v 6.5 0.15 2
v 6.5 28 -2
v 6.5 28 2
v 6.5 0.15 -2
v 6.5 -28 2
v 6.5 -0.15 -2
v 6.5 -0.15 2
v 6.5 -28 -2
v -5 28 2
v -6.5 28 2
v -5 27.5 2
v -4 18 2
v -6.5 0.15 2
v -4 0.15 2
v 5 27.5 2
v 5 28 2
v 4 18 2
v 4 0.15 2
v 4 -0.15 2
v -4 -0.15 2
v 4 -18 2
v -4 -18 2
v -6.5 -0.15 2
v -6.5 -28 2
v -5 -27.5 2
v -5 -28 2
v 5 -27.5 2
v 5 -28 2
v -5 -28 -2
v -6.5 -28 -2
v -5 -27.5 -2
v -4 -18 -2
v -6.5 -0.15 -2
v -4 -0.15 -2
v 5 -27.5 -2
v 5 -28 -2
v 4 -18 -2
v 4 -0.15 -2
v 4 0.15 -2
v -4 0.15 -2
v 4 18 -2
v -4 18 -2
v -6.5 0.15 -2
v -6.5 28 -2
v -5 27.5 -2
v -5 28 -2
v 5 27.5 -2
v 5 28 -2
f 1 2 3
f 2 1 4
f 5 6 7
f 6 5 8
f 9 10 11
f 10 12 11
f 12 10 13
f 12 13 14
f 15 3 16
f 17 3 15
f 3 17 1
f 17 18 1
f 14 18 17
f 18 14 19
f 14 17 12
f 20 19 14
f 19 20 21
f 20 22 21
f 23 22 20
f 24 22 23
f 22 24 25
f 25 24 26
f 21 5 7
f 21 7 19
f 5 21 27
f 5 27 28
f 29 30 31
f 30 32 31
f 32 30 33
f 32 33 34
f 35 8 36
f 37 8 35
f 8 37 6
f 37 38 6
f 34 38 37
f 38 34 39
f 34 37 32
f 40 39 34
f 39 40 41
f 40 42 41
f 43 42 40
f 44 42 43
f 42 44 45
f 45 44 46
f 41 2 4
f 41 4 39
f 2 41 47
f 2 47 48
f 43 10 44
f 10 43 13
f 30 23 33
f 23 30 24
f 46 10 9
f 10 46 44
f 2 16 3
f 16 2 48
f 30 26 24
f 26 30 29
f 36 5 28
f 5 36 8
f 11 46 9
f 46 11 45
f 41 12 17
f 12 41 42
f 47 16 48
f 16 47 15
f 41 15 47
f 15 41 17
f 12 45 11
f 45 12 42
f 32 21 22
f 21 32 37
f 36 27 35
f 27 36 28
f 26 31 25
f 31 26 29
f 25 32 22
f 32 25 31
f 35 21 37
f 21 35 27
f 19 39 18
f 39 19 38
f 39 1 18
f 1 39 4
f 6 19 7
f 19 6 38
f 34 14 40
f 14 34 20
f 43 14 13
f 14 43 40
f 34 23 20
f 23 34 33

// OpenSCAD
WIDTH = 13;
HEIGHT = 4;
LENGTH = 56;
BAR_LENGTH = 36;
BAR_WIDTH_MID = 8;
BAR_WIDTH_OUT = 10;
SLOT_WIDTH = 0.3;
SLOT_LENGTH = (WIDTH - min(BAR_WIDTH_OUT, BAR_WIDTH_MID))/2;

module bar() {
  #translate([0, BAR_LENGTH/2, 0])
  hull() {
    translate([0, 0.5, 0])
    cube(size = [BAR_WIDTH_MID, 1, HEIGHT], center = true);
    translate([0, (LENGTH - BAR_LENGTH)/2, 0])
    cube(size = [BAR_WIDTH_OUT, 1, HEIGHT], center = true);
  }
}

module slot() {
  #translate([(WIDTH - SLOT_LENGTH)/2, 0, 0])
  cube(size = [SLOT_LENGTH, SLOT_WIDTH, HEIGHT], center = true);
}

module spool() {
  difference() {
    cube(size = [WIDTH, LENGTH, HEIGHT], center = true);
    bar();
    rotate([0, 0, 180])
    bar();
    slot();
    rotate([0, 0, 180])
    slot();
  }
}

spool();
